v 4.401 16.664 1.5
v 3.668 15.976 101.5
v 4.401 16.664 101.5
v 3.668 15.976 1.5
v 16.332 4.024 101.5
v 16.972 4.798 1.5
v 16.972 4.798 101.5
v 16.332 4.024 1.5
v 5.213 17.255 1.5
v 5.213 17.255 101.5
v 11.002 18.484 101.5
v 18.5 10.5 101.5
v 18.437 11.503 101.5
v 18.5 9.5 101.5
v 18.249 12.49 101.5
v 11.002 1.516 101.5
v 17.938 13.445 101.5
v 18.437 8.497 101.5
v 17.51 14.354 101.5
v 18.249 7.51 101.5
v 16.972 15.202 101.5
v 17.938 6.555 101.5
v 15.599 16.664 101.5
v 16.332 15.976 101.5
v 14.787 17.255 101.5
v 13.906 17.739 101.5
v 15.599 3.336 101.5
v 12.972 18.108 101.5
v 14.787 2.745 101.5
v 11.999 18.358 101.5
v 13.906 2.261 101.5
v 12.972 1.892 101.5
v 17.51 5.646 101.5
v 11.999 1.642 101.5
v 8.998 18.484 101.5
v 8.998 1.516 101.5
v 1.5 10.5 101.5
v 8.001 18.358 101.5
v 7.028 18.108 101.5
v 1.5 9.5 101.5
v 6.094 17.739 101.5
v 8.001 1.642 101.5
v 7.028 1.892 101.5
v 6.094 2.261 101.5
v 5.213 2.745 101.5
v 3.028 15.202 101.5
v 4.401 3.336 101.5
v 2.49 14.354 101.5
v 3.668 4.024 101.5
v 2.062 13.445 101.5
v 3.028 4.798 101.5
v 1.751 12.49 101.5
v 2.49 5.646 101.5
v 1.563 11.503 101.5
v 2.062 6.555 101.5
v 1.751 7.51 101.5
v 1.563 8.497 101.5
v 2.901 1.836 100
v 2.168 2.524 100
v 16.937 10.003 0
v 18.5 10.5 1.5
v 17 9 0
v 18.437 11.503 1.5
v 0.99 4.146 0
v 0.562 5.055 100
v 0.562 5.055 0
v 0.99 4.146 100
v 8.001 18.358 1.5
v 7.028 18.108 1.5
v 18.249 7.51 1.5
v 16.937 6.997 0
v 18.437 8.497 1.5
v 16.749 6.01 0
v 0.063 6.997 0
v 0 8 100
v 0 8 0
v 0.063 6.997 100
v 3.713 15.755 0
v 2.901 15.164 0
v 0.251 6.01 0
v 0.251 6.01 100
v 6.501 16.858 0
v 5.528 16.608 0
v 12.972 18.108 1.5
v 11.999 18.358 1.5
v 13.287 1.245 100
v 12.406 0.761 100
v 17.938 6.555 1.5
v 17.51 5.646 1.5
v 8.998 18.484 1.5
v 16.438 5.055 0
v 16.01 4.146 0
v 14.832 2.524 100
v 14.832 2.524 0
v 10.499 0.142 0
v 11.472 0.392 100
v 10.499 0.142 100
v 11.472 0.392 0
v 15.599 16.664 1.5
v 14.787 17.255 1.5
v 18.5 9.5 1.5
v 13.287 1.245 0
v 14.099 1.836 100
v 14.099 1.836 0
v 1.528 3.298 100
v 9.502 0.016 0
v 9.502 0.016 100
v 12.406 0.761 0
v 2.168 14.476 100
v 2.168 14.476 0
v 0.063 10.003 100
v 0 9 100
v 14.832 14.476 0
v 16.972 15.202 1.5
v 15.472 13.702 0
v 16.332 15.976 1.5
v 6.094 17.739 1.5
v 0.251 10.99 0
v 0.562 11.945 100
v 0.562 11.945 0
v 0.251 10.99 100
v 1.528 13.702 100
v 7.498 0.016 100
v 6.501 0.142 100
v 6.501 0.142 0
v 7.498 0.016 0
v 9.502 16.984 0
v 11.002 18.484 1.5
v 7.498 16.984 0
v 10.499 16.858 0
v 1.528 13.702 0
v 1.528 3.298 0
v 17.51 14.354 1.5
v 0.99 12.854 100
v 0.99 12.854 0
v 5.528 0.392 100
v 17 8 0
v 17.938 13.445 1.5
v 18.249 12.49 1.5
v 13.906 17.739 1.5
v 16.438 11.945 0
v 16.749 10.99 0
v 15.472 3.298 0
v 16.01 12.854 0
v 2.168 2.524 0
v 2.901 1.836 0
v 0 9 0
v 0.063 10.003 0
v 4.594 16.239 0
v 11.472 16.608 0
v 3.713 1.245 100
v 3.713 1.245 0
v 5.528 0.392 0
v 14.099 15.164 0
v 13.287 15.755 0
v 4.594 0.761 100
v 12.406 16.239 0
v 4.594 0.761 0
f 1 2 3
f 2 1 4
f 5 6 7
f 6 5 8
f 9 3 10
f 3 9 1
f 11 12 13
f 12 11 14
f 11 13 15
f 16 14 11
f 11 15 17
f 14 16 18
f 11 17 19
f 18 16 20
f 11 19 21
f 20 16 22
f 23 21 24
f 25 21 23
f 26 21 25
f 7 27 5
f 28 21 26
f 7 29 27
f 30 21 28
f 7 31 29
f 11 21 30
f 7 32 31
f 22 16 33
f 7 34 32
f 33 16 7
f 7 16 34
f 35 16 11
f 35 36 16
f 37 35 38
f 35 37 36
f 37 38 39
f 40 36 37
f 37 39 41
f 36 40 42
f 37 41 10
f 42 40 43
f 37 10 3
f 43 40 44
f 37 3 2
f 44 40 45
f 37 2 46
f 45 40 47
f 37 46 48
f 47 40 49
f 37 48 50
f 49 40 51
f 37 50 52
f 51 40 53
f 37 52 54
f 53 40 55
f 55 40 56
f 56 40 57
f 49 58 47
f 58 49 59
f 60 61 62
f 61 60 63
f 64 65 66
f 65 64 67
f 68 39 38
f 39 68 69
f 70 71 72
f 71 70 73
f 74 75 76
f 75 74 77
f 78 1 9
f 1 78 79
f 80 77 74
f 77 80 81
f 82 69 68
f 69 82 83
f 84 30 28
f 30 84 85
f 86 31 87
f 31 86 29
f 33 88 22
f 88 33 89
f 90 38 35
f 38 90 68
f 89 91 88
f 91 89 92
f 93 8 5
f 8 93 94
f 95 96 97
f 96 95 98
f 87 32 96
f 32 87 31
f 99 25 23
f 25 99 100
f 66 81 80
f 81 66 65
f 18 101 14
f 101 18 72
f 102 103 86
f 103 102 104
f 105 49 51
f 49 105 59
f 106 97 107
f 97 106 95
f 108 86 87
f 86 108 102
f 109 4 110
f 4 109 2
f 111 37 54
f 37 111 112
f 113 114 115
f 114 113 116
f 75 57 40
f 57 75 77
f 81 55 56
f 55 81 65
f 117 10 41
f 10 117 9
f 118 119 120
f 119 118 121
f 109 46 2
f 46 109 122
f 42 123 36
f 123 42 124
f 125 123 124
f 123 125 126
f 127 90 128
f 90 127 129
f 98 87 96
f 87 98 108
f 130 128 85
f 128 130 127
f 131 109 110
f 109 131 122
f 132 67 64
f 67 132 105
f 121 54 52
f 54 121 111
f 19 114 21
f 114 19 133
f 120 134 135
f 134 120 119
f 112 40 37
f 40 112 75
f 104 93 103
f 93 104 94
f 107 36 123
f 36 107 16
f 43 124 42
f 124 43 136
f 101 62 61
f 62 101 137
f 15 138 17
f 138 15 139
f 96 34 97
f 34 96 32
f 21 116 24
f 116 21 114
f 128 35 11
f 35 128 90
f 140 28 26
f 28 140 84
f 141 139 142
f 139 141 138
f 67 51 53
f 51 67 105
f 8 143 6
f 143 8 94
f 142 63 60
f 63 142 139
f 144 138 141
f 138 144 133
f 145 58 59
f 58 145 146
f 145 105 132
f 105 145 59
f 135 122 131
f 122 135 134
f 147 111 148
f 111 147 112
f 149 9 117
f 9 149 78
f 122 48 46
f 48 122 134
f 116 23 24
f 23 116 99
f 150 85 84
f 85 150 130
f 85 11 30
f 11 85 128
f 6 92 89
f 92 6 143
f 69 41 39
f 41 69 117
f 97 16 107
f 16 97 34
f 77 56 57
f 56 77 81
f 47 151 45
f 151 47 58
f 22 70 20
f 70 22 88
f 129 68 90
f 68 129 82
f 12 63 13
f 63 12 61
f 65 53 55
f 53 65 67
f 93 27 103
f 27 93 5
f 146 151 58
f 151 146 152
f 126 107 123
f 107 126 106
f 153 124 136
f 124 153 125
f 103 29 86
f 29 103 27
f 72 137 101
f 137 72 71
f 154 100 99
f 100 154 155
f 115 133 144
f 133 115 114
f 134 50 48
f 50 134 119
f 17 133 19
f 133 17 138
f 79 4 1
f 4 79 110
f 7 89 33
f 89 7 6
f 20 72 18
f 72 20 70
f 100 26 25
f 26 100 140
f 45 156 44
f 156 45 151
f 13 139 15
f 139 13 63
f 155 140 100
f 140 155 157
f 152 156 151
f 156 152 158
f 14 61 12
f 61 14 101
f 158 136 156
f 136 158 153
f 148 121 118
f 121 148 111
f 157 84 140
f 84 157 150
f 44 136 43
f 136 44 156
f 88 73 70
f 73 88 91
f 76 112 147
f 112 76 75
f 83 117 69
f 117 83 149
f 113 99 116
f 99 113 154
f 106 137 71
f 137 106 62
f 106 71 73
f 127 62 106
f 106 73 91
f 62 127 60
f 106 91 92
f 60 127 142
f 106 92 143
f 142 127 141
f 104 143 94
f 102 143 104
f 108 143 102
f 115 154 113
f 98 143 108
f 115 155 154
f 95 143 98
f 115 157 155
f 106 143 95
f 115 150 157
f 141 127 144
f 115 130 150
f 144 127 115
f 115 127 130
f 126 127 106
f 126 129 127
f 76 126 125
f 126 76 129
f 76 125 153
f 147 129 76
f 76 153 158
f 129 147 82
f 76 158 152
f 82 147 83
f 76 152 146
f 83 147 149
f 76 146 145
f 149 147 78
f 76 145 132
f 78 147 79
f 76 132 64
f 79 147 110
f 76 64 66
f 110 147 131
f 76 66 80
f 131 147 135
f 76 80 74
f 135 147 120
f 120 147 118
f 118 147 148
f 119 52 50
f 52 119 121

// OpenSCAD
$fn = 128;

bugfix = $preview ? .1 : 0;

corners = 8;
height = 1.5;
shrink = height;
bottom_size = [100,110];
top_size = [bottom_size[0]-shrink*2,bottom_size[1]-shrink*2];
border = true;
border_width = 1;
border_height = 1;
holes = true;
hole_d = 5;
hole_h = height*2;
hole_dist = 10;

module rounded_square(size, radius) {
    translate([radius,radius]) {
        minkowski() {
            square([size[0] - 2*radius, size[1] - 2 * radius]);
            circle(r=radius, $fn=50);
        }
    }
}

module rounded_cube(size, radius, height) {
    linear_extrude(height) {
        rounded_square(size, radius);
    }
}

module border() {
    translate([shrink,shrink,height]) {
        difference() {
            rounded_cube(size=top_size, radius=corners, border_height);
            translate([border_width,border_width,0]) {
                rounded_cube(size=[top_size[0]-border_width*2,
                    top_size[1]-border_width*2],
                    radius=corners, border_height);
            }
        }
    }
}

module bunnplate() {
    hull() {
        rounded_cube(size=bottom_size,radius=corners, .1);
        translate([shrink,shrink,height]) {
            rounded_cube(size=top_size,radius=corners, .1);
        }
    }
    if (border) {
        border();
    }
}

render() {
    difference() {
        bunnplate();
        if (holes) {
            translate([hole_dist,bottom_size[1]-hole_dist,-bugfix]) {
                cylinder(d=hole_d,h=hole_h+bugfix*2);
            }
            translate([bottom_size[0]-hole_dist,
                bottom_size[1]-hole_dist,-bugfix]) {
                cylinder(d=hole_d,h=hole_h+bugfix*2);
            }
        }
    }
}
